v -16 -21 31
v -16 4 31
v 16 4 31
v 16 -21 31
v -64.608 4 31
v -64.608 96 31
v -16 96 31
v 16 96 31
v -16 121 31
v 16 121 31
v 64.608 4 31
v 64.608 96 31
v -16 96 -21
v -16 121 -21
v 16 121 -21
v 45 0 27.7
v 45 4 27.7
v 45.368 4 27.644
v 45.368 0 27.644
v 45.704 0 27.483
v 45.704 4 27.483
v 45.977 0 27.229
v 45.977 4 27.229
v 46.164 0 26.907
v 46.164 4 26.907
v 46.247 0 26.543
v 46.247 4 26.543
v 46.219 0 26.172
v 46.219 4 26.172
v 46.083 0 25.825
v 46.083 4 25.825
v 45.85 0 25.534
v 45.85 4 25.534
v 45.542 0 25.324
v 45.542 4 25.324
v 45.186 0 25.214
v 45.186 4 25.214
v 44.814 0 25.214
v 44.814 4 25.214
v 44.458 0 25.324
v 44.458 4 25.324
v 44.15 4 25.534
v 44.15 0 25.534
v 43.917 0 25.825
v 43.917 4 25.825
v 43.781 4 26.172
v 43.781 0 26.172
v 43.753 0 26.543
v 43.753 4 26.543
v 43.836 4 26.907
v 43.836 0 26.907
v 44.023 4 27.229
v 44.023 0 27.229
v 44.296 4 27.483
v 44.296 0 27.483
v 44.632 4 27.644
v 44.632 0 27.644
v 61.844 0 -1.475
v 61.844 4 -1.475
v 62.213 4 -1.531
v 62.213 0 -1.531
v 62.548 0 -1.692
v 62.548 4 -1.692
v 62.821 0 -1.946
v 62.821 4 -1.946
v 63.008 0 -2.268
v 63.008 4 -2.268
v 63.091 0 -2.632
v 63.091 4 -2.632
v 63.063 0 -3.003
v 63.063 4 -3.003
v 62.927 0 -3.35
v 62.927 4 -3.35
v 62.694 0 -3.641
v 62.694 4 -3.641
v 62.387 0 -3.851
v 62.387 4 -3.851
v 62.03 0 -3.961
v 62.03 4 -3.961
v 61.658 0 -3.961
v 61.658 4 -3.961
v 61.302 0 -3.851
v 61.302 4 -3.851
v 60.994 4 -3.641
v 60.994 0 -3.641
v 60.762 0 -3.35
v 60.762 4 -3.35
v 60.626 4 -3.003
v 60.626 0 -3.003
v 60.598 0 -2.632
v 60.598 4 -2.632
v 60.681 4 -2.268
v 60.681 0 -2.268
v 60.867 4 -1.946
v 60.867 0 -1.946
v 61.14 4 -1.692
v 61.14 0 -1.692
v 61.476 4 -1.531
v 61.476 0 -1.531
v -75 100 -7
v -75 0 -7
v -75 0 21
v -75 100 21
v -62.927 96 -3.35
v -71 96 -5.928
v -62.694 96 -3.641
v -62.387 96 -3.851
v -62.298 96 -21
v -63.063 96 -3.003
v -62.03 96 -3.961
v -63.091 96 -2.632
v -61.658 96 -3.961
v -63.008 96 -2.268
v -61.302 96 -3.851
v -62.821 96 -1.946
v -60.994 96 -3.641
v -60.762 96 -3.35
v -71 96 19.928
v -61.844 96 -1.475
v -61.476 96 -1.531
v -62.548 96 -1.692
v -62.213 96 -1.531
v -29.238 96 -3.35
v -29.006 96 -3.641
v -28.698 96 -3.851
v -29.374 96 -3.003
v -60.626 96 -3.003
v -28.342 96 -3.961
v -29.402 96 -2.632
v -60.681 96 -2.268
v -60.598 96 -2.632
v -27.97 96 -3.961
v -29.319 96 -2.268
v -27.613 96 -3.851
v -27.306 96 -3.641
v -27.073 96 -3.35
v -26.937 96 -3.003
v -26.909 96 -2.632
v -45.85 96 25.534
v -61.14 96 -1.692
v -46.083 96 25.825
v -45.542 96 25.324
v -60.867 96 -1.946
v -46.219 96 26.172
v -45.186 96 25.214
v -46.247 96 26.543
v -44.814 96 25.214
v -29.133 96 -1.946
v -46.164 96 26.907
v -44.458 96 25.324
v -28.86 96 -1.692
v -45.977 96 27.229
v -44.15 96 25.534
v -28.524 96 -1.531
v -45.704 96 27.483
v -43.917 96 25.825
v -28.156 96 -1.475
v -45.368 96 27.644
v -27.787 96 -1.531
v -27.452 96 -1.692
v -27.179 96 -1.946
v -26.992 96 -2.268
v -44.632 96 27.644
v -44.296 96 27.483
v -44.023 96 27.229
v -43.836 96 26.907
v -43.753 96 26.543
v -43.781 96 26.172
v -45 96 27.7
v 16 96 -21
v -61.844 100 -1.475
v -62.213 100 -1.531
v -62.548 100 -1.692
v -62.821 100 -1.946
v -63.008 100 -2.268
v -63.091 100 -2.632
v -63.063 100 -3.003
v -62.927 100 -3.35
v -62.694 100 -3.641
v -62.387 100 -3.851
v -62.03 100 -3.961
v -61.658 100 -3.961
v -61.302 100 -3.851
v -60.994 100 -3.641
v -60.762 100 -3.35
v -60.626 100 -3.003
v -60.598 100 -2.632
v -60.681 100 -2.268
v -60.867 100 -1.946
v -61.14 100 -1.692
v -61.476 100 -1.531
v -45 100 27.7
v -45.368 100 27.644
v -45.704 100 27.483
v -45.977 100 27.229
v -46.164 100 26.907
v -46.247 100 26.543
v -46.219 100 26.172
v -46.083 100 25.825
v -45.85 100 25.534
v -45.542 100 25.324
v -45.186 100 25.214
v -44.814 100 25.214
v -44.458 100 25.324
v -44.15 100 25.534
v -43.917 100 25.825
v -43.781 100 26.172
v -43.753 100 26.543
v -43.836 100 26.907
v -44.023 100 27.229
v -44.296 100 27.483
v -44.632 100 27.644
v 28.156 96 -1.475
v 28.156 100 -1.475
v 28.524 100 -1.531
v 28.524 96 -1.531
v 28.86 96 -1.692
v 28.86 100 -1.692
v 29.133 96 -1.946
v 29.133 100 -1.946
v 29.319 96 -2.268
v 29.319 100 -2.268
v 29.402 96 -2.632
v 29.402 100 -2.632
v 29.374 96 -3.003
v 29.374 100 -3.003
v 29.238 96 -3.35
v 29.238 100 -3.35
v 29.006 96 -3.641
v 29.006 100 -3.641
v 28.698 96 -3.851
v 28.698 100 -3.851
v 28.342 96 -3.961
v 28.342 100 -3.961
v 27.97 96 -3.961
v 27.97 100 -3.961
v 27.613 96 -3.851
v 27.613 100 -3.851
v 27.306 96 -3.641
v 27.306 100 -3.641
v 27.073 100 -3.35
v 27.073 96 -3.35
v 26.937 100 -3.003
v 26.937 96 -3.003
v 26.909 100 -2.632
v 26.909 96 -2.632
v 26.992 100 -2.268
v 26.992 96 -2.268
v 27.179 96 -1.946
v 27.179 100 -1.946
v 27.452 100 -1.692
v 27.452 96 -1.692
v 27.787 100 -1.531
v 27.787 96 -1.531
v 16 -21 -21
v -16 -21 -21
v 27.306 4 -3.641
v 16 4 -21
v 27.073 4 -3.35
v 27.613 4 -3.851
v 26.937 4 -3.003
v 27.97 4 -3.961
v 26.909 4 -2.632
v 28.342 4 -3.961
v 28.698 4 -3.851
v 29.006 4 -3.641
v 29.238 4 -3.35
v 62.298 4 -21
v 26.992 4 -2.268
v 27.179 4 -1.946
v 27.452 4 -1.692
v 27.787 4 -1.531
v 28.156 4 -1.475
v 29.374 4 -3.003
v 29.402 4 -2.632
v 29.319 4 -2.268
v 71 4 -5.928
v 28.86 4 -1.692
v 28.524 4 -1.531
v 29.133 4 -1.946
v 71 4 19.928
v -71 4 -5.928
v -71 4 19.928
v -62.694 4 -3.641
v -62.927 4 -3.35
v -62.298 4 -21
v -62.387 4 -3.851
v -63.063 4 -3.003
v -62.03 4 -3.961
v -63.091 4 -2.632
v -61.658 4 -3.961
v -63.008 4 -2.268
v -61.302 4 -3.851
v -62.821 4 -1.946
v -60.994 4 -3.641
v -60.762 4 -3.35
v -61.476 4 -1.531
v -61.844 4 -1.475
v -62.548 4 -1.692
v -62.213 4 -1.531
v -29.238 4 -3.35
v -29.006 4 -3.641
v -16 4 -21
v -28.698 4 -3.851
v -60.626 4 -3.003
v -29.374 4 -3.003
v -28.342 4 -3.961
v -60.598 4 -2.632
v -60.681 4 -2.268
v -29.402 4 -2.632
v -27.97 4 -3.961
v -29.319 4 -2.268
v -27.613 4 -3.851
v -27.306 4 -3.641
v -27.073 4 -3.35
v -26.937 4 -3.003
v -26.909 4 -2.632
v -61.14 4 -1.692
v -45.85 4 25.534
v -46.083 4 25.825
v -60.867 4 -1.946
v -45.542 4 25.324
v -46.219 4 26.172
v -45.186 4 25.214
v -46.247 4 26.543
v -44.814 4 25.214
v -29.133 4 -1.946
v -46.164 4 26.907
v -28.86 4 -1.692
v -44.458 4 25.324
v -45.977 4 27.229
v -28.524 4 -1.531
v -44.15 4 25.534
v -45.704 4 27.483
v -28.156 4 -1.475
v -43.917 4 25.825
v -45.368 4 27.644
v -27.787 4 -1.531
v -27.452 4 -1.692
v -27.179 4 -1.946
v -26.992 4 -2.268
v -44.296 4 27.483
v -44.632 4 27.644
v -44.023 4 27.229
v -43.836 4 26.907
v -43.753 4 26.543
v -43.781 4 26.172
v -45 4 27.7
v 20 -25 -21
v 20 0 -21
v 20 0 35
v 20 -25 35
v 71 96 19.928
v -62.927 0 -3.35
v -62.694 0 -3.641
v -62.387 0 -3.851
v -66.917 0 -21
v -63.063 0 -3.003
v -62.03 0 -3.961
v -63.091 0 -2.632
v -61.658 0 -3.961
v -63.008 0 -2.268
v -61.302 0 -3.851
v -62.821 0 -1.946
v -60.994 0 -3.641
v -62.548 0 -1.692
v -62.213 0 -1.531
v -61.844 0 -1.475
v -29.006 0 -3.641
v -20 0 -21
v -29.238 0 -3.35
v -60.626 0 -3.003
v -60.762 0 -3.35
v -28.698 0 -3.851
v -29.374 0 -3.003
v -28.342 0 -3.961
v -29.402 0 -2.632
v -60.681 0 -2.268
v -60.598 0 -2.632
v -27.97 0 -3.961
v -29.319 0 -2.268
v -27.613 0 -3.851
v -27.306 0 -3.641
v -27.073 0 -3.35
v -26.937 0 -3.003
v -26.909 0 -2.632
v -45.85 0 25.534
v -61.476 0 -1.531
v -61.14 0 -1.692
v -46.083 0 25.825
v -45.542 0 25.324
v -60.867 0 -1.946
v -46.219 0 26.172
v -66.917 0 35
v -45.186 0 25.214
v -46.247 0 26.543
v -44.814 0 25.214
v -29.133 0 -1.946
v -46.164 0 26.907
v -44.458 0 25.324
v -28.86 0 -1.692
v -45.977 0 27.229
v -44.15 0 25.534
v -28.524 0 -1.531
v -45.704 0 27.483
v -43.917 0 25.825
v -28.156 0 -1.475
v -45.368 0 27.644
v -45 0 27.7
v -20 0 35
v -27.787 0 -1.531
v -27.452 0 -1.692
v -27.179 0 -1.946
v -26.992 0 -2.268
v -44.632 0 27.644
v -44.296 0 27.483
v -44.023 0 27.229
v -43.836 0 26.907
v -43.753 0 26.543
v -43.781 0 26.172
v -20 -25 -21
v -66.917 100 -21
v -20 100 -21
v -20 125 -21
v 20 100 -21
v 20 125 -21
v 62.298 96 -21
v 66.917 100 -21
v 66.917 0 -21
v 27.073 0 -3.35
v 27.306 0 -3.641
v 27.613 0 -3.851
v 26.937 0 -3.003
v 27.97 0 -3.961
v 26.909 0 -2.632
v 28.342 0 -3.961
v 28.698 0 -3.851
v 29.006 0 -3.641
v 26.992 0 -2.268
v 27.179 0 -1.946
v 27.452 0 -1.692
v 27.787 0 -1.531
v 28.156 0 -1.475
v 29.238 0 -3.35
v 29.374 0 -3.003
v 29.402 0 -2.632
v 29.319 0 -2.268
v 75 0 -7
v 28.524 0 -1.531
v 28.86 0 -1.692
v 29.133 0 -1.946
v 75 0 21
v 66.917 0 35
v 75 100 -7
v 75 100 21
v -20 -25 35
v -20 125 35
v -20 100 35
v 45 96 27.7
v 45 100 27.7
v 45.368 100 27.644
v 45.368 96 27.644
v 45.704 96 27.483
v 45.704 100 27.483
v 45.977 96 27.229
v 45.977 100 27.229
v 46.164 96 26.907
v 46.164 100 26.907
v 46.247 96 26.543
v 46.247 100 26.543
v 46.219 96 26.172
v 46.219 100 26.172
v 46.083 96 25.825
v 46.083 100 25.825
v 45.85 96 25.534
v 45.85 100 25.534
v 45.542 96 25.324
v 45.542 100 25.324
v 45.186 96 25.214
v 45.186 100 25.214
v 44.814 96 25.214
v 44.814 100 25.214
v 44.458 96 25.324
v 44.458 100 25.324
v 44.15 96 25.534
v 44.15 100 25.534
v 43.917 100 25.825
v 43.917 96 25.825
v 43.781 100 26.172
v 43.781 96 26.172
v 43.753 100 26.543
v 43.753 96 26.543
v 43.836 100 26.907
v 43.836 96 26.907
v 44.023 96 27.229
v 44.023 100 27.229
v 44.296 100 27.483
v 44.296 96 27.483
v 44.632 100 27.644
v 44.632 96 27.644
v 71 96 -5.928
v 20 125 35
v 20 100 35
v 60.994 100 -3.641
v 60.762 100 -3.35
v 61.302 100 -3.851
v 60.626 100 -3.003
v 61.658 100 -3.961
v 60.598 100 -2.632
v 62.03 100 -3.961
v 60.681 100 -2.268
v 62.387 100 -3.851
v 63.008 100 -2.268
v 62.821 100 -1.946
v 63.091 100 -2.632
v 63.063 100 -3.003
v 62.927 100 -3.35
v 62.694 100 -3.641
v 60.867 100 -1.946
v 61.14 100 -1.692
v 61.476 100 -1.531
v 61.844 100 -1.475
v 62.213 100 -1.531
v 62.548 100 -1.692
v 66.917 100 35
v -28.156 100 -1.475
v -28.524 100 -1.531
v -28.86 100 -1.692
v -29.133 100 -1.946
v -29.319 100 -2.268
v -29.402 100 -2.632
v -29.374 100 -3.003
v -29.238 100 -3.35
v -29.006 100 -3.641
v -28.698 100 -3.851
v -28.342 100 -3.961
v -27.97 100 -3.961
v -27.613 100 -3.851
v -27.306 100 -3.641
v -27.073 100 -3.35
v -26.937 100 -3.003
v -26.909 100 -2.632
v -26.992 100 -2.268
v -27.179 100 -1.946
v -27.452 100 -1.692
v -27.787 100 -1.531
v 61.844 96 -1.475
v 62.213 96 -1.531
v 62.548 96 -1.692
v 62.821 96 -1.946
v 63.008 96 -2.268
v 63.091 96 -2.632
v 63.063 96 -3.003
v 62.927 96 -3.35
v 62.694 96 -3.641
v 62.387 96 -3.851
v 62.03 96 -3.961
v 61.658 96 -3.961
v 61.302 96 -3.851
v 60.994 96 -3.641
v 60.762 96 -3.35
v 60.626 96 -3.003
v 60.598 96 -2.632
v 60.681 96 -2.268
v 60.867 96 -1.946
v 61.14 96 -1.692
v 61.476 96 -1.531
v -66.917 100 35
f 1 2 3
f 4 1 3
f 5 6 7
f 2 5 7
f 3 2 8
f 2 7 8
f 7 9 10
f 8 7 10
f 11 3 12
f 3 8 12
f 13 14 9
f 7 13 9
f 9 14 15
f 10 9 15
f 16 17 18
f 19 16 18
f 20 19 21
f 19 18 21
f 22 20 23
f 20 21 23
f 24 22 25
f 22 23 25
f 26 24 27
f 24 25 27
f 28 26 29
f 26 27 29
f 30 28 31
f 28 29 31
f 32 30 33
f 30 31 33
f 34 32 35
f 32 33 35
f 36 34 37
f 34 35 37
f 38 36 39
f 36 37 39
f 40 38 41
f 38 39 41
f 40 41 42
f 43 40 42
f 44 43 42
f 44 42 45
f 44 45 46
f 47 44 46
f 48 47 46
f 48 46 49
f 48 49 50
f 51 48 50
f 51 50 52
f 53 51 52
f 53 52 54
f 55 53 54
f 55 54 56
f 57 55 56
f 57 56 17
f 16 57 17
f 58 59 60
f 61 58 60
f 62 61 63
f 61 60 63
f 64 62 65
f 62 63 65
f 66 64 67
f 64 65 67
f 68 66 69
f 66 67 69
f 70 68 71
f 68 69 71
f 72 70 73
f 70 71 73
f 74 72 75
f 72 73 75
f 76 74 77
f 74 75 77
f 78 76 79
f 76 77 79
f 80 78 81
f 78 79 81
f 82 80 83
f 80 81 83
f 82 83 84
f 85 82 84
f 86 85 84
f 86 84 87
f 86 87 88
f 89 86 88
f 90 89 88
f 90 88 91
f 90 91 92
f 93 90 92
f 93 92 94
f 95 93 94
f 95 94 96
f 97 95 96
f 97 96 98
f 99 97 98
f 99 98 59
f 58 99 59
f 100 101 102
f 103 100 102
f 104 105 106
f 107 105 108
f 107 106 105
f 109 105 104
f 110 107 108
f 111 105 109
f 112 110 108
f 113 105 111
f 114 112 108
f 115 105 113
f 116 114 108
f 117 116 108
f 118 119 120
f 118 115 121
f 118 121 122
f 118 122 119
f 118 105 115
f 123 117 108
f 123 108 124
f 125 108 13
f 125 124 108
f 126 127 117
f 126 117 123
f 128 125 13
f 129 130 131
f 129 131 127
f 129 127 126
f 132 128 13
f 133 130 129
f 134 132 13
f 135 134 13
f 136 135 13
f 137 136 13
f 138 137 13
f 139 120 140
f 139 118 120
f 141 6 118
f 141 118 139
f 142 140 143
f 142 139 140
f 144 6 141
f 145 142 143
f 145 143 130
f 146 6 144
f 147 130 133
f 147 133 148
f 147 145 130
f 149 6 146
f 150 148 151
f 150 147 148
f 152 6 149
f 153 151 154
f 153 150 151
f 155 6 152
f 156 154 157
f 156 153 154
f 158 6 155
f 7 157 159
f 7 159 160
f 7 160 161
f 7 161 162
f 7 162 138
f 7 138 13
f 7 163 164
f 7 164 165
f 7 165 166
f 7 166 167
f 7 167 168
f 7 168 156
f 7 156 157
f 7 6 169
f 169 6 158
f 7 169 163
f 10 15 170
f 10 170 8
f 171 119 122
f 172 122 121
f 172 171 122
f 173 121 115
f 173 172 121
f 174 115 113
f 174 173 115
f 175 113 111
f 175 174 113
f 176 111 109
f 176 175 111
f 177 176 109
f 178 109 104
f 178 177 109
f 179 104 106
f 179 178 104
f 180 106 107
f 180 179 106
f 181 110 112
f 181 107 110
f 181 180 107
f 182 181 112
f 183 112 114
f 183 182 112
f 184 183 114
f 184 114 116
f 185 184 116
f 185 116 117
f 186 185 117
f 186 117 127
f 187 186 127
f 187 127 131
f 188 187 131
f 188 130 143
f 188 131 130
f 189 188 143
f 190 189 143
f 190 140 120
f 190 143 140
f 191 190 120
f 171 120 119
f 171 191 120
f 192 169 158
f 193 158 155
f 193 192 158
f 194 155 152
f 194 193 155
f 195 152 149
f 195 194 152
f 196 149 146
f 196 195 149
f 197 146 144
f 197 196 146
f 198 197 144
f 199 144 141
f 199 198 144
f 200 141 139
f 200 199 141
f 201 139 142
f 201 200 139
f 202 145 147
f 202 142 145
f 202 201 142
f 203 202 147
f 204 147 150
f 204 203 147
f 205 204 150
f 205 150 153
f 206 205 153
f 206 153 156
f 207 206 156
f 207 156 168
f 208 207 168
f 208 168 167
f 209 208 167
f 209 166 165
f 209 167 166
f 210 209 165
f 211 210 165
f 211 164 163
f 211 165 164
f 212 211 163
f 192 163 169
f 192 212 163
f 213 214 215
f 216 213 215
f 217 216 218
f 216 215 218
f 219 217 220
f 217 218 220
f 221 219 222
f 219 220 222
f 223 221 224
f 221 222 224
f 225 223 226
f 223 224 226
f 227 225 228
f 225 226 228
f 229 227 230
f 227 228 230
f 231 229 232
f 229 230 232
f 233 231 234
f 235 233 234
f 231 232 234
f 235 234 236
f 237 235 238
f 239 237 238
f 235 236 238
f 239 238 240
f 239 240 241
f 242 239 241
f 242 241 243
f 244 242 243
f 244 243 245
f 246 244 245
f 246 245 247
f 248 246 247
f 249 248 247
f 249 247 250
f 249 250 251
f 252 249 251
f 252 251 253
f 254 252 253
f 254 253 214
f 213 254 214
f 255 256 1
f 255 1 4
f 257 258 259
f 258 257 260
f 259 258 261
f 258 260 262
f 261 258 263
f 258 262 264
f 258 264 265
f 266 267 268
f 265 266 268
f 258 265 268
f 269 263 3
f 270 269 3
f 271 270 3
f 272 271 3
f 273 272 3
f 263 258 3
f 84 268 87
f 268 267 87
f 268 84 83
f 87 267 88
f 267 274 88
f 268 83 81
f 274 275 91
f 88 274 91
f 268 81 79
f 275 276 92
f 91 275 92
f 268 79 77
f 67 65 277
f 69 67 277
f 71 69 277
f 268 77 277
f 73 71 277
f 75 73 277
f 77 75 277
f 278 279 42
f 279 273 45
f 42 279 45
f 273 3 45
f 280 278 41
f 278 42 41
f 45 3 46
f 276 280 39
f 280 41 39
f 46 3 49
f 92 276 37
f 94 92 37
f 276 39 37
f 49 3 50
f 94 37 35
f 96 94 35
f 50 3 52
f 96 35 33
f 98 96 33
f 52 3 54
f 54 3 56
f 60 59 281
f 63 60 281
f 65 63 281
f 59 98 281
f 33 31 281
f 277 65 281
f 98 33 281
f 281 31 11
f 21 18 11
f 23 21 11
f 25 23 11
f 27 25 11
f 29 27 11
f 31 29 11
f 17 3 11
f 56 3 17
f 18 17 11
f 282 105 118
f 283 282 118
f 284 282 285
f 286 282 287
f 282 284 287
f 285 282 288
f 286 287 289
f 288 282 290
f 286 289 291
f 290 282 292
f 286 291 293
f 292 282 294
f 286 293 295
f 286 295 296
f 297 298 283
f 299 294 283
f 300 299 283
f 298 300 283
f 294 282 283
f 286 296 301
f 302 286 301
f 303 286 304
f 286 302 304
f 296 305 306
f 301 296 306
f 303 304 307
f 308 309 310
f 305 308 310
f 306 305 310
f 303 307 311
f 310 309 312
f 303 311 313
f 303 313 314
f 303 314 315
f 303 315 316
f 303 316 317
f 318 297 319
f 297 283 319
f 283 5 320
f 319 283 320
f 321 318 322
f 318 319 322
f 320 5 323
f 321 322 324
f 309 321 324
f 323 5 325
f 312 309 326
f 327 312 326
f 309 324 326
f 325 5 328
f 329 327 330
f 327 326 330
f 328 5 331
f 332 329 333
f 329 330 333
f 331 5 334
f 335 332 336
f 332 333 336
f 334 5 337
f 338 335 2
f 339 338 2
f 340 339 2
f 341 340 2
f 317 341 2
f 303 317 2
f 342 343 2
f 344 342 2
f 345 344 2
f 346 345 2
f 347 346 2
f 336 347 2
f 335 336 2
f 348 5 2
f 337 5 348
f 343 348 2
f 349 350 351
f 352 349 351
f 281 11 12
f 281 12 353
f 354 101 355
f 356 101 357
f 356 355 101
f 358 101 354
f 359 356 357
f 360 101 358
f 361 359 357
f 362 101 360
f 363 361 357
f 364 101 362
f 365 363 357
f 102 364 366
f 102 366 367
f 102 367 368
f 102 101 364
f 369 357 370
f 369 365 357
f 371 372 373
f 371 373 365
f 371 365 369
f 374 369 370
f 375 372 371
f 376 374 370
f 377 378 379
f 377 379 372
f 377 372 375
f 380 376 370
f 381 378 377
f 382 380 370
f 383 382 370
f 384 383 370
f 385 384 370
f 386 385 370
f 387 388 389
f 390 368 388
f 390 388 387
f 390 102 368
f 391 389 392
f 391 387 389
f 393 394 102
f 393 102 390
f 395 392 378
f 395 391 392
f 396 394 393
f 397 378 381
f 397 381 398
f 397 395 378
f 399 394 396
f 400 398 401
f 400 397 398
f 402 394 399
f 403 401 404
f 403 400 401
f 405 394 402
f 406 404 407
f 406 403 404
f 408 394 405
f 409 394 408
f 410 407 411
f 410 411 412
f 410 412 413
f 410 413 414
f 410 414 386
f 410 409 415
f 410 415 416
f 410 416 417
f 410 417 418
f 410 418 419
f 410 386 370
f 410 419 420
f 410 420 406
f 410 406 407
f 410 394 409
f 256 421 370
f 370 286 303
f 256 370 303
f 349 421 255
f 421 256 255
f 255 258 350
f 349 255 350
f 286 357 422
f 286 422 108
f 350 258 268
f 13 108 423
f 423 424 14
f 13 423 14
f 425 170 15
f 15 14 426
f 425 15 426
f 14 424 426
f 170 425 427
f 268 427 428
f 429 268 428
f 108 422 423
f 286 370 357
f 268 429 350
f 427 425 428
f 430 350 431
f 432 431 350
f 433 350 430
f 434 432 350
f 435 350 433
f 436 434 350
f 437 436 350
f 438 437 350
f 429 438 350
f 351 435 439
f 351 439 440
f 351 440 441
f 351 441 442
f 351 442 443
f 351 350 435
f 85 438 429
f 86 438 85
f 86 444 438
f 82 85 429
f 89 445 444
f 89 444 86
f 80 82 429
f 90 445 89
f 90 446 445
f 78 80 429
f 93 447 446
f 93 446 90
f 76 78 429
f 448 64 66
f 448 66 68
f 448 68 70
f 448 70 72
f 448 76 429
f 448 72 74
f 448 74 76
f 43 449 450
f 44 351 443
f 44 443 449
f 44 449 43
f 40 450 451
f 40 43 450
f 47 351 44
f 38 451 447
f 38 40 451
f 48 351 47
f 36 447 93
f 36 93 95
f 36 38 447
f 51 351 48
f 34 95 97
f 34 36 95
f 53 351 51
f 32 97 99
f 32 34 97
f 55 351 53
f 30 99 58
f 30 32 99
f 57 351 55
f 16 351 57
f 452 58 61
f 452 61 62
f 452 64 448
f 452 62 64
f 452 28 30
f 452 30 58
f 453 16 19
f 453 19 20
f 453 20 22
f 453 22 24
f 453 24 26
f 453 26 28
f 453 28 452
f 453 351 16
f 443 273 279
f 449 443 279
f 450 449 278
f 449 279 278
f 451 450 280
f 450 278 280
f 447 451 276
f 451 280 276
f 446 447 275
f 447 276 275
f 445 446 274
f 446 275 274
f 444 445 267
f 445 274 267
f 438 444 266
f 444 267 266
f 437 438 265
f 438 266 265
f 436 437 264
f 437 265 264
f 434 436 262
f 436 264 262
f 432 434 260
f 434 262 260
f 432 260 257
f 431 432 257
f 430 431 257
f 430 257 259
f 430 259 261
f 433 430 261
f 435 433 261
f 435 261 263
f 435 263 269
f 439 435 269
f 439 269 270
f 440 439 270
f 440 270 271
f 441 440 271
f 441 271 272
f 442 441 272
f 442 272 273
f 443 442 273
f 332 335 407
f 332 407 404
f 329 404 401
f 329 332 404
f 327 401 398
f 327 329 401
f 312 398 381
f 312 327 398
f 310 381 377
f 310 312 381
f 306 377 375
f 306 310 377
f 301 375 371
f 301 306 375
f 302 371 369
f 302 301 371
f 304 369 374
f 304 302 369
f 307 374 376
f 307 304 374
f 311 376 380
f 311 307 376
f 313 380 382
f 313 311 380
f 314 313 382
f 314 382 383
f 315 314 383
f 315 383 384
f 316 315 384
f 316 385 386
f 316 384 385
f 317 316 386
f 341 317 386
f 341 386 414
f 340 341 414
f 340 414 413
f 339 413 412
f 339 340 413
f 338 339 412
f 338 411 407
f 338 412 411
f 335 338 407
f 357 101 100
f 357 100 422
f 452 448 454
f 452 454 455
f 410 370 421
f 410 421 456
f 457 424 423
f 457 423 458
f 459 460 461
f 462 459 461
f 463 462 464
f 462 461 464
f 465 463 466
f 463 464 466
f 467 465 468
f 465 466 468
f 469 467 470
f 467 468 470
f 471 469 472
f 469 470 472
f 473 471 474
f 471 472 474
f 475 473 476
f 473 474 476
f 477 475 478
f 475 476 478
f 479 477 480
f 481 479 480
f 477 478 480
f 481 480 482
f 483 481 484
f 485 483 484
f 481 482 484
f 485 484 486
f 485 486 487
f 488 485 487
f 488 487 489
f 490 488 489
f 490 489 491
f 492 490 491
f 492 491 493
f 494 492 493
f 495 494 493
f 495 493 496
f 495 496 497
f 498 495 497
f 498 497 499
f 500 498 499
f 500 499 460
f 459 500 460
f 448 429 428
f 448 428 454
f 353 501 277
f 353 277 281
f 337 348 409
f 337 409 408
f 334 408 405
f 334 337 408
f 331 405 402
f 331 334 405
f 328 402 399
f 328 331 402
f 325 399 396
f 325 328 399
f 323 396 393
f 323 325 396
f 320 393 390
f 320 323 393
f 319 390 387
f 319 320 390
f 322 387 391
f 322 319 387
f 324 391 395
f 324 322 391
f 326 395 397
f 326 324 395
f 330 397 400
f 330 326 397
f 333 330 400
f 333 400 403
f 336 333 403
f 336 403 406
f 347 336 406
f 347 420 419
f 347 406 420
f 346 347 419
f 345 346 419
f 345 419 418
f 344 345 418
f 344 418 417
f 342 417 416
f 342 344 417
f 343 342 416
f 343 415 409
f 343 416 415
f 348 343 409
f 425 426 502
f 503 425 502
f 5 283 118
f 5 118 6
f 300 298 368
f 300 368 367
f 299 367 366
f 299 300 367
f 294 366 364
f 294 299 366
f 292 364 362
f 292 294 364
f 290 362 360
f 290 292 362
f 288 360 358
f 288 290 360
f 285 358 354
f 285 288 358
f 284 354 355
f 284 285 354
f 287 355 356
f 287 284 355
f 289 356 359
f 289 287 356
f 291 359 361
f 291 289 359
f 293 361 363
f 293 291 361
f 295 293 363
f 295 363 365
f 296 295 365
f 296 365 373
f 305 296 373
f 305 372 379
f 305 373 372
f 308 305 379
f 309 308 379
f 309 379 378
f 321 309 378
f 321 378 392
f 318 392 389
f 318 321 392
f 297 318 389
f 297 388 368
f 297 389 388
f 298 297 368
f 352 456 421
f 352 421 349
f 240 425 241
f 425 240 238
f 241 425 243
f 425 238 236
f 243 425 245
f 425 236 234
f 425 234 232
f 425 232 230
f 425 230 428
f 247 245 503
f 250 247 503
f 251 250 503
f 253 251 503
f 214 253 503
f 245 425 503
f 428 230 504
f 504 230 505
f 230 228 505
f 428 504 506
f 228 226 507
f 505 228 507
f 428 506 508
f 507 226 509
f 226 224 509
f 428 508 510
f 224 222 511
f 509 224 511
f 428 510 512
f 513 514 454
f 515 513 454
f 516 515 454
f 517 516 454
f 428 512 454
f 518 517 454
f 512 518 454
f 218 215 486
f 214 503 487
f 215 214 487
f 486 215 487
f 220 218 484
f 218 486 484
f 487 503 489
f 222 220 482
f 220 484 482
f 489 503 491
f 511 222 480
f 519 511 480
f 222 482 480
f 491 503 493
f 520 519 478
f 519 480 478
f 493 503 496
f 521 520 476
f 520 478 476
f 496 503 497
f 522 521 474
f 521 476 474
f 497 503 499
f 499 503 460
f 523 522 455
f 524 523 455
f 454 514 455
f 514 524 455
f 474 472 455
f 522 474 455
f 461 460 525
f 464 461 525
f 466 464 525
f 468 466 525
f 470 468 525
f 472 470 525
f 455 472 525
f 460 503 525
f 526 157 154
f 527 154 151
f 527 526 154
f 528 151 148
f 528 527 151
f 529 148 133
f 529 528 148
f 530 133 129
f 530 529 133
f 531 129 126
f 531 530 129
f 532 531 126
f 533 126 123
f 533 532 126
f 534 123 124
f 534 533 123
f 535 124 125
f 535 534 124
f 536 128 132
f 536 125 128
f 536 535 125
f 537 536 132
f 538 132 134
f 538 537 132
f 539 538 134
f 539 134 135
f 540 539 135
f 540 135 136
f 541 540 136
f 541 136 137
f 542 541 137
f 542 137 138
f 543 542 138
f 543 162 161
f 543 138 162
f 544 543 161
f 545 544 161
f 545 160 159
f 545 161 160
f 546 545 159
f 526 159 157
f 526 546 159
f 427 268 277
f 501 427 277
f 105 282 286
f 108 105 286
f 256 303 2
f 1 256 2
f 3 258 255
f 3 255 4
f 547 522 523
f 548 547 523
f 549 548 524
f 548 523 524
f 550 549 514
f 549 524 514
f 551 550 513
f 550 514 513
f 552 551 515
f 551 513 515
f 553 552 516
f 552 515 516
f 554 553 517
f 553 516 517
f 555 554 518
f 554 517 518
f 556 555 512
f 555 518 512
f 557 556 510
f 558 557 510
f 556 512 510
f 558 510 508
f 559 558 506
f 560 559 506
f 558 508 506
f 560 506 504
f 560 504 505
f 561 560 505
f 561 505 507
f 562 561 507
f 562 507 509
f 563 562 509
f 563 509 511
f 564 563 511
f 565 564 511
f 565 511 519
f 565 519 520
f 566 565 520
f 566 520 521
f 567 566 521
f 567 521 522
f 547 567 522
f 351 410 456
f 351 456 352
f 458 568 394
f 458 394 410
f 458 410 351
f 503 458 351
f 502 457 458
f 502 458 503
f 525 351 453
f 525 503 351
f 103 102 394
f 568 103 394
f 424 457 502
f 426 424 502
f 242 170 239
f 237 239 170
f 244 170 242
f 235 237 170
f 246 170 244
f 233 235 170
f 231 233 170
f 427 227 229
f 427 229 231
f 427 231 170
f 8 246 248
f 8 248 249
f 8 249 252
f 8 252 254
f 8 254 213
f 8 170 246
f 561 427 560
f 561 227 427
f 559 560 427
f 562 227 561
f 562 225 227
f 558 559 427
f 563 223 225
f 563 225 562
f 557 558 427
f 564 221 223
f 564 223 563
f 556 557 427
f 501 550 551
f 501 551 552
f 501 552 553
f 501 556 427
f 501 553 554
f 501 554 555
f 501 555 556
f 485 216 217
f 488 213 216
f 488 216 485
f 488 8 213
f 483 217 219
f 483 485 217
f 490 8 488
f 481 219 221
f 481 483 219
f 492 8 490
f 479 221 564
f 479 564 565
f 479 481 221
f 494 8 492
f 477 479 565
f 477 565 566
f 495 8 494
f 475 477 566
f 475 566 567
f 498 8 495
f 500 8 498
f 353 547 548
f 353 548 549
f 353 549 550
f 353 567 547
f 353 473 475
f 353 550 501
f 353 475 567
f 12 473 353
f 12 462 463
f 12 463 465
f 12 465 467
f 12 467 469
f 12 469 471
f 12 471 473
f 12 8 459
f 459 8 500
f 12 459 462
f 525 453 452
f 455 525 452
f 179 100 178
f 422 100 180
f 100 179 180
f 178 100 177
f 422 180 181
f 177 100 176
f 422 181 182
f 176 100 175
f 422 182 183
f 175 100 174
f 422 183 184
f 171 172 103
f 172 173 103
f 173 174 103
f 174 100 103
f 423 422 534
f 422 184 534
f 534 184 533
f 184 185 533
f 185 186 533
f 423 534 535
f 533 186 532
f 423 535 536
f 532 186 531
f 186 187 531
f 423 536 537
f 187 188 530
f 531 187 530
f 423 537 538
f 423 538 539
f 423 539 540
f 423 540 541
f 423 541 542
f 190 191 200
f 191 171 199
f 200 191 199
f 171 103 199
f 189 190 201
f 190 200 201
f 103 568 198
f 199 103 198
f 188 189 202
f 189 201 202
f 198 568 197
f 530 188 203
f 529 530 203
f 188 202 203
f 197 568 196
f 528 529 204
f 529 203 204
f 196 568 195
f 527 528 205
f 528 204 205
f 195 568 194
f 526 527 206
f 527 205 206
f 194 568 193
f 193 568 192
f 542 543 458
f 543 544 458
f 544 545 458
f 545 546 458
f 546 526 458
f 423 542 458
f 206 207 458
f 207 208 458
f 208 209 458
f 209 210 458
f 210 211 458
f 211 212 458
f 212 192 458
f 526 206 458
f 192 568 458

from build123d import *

# Parameters (mm, degrees)
ESQUISSE1_W             = 150
ESQUISSE1_H             = 14
BOSS_EXTRU_1_DEPTH      = 100
BOSS_EXTRU_2_DEPTH      = 25
BOSS_EXTRU_2_DEPTH_BACK = 125
ESQUISSE3_W             = 40
ESQUISSE3_H             = 56
COQUE1_T                = -4
ESQUISSE2_R             = 1.25
ENL_V_MAT_EXTRU_1_DEPTH = 150.916643506


with BuildPart() as part:
    # Esquisse1 → Boss.-Extru.1 (new body)
    with BuildSketch(Plane(origin=(0, 0, 0), x_dir=(1, 0, 0), z_dir=(0, 1, 0))):
        Rectangle(ESQUISSE1_W, ESQUISSE1_H)
        Polygon((66.917096231, 21), (75, 7), (-75, 7), (-66.917096231, 21), align=None)
    boss_extru_1 = extrude(amount=BOSS_EXTRU_1_DEPTH)

    # Symétrie1: Boss.-Extru.1 across plane
    add(boss_extru_1.mirror(Plane(origin=(0, 100, 7), x_dir=(1, 0, 0), z_dir=(0, 0, -1))))

    # Esquisse3 → Boss.-Extru.2 (add, two sides: drawn at the far end of the back side and taken through both)
    with BuildSketch(Plane.XZ.offset(-BOSS_EXTRU_2_DEPTH_BACK)):
        with Locations((0, 7)):
            Rectangle(ESQUISSE3_W, ESQUISSE3_H)
    extrude(amount=BOSS_EXTRU_2_DEPTH + BOSS_EXTRU_2_DEPTH_BACK)

    # Coque1
    coque1_openings = [part.faces().sort_by_distance(p)[0] for p in [
        (0, 50, -21),
    ]]
    offset(amount=COQUE1_T, openings=coque1_openings, kind=Kind.INTERSECTION)

    # Esquisse2 → Enlèv. mat.-Extru.1 (cut, through all)
    with BuildSketch(Plane(origin=(0, 100, 0), x_dir=(1, 0, 0), z_dir=(0, 1, 0))):
        with Locations(Location((45, -26.45, 0), (0, 0, 270))):
            Circle(ESQUISSE2_R)
        with Locations(Location((61.844194104, 2.725, 0), (0, 0, 270))):
            Circle(ESQUISSE2_R)
        with Locations(Location((28.155805896, 2.725, 0), (0, 0, 270))):
            Circle(ESQUISSE2_R)
    enl_v_mat_extru_1 = extrude(amount=-ENL_V_MAT_EXTRU_1_DEPTH, mode=Mode.SUBTRACT)

    # Symétrie2: Enlèv. mat.-Extru.1 across plane
    add(enl_v_mat_extru_1.mirror(Plane(origin=(0, 0, 0), x_dir=(0, 0, 1), z_dir=(1, 0, 0))), mode=Mode.SUBTRACT)


solid = part.part
